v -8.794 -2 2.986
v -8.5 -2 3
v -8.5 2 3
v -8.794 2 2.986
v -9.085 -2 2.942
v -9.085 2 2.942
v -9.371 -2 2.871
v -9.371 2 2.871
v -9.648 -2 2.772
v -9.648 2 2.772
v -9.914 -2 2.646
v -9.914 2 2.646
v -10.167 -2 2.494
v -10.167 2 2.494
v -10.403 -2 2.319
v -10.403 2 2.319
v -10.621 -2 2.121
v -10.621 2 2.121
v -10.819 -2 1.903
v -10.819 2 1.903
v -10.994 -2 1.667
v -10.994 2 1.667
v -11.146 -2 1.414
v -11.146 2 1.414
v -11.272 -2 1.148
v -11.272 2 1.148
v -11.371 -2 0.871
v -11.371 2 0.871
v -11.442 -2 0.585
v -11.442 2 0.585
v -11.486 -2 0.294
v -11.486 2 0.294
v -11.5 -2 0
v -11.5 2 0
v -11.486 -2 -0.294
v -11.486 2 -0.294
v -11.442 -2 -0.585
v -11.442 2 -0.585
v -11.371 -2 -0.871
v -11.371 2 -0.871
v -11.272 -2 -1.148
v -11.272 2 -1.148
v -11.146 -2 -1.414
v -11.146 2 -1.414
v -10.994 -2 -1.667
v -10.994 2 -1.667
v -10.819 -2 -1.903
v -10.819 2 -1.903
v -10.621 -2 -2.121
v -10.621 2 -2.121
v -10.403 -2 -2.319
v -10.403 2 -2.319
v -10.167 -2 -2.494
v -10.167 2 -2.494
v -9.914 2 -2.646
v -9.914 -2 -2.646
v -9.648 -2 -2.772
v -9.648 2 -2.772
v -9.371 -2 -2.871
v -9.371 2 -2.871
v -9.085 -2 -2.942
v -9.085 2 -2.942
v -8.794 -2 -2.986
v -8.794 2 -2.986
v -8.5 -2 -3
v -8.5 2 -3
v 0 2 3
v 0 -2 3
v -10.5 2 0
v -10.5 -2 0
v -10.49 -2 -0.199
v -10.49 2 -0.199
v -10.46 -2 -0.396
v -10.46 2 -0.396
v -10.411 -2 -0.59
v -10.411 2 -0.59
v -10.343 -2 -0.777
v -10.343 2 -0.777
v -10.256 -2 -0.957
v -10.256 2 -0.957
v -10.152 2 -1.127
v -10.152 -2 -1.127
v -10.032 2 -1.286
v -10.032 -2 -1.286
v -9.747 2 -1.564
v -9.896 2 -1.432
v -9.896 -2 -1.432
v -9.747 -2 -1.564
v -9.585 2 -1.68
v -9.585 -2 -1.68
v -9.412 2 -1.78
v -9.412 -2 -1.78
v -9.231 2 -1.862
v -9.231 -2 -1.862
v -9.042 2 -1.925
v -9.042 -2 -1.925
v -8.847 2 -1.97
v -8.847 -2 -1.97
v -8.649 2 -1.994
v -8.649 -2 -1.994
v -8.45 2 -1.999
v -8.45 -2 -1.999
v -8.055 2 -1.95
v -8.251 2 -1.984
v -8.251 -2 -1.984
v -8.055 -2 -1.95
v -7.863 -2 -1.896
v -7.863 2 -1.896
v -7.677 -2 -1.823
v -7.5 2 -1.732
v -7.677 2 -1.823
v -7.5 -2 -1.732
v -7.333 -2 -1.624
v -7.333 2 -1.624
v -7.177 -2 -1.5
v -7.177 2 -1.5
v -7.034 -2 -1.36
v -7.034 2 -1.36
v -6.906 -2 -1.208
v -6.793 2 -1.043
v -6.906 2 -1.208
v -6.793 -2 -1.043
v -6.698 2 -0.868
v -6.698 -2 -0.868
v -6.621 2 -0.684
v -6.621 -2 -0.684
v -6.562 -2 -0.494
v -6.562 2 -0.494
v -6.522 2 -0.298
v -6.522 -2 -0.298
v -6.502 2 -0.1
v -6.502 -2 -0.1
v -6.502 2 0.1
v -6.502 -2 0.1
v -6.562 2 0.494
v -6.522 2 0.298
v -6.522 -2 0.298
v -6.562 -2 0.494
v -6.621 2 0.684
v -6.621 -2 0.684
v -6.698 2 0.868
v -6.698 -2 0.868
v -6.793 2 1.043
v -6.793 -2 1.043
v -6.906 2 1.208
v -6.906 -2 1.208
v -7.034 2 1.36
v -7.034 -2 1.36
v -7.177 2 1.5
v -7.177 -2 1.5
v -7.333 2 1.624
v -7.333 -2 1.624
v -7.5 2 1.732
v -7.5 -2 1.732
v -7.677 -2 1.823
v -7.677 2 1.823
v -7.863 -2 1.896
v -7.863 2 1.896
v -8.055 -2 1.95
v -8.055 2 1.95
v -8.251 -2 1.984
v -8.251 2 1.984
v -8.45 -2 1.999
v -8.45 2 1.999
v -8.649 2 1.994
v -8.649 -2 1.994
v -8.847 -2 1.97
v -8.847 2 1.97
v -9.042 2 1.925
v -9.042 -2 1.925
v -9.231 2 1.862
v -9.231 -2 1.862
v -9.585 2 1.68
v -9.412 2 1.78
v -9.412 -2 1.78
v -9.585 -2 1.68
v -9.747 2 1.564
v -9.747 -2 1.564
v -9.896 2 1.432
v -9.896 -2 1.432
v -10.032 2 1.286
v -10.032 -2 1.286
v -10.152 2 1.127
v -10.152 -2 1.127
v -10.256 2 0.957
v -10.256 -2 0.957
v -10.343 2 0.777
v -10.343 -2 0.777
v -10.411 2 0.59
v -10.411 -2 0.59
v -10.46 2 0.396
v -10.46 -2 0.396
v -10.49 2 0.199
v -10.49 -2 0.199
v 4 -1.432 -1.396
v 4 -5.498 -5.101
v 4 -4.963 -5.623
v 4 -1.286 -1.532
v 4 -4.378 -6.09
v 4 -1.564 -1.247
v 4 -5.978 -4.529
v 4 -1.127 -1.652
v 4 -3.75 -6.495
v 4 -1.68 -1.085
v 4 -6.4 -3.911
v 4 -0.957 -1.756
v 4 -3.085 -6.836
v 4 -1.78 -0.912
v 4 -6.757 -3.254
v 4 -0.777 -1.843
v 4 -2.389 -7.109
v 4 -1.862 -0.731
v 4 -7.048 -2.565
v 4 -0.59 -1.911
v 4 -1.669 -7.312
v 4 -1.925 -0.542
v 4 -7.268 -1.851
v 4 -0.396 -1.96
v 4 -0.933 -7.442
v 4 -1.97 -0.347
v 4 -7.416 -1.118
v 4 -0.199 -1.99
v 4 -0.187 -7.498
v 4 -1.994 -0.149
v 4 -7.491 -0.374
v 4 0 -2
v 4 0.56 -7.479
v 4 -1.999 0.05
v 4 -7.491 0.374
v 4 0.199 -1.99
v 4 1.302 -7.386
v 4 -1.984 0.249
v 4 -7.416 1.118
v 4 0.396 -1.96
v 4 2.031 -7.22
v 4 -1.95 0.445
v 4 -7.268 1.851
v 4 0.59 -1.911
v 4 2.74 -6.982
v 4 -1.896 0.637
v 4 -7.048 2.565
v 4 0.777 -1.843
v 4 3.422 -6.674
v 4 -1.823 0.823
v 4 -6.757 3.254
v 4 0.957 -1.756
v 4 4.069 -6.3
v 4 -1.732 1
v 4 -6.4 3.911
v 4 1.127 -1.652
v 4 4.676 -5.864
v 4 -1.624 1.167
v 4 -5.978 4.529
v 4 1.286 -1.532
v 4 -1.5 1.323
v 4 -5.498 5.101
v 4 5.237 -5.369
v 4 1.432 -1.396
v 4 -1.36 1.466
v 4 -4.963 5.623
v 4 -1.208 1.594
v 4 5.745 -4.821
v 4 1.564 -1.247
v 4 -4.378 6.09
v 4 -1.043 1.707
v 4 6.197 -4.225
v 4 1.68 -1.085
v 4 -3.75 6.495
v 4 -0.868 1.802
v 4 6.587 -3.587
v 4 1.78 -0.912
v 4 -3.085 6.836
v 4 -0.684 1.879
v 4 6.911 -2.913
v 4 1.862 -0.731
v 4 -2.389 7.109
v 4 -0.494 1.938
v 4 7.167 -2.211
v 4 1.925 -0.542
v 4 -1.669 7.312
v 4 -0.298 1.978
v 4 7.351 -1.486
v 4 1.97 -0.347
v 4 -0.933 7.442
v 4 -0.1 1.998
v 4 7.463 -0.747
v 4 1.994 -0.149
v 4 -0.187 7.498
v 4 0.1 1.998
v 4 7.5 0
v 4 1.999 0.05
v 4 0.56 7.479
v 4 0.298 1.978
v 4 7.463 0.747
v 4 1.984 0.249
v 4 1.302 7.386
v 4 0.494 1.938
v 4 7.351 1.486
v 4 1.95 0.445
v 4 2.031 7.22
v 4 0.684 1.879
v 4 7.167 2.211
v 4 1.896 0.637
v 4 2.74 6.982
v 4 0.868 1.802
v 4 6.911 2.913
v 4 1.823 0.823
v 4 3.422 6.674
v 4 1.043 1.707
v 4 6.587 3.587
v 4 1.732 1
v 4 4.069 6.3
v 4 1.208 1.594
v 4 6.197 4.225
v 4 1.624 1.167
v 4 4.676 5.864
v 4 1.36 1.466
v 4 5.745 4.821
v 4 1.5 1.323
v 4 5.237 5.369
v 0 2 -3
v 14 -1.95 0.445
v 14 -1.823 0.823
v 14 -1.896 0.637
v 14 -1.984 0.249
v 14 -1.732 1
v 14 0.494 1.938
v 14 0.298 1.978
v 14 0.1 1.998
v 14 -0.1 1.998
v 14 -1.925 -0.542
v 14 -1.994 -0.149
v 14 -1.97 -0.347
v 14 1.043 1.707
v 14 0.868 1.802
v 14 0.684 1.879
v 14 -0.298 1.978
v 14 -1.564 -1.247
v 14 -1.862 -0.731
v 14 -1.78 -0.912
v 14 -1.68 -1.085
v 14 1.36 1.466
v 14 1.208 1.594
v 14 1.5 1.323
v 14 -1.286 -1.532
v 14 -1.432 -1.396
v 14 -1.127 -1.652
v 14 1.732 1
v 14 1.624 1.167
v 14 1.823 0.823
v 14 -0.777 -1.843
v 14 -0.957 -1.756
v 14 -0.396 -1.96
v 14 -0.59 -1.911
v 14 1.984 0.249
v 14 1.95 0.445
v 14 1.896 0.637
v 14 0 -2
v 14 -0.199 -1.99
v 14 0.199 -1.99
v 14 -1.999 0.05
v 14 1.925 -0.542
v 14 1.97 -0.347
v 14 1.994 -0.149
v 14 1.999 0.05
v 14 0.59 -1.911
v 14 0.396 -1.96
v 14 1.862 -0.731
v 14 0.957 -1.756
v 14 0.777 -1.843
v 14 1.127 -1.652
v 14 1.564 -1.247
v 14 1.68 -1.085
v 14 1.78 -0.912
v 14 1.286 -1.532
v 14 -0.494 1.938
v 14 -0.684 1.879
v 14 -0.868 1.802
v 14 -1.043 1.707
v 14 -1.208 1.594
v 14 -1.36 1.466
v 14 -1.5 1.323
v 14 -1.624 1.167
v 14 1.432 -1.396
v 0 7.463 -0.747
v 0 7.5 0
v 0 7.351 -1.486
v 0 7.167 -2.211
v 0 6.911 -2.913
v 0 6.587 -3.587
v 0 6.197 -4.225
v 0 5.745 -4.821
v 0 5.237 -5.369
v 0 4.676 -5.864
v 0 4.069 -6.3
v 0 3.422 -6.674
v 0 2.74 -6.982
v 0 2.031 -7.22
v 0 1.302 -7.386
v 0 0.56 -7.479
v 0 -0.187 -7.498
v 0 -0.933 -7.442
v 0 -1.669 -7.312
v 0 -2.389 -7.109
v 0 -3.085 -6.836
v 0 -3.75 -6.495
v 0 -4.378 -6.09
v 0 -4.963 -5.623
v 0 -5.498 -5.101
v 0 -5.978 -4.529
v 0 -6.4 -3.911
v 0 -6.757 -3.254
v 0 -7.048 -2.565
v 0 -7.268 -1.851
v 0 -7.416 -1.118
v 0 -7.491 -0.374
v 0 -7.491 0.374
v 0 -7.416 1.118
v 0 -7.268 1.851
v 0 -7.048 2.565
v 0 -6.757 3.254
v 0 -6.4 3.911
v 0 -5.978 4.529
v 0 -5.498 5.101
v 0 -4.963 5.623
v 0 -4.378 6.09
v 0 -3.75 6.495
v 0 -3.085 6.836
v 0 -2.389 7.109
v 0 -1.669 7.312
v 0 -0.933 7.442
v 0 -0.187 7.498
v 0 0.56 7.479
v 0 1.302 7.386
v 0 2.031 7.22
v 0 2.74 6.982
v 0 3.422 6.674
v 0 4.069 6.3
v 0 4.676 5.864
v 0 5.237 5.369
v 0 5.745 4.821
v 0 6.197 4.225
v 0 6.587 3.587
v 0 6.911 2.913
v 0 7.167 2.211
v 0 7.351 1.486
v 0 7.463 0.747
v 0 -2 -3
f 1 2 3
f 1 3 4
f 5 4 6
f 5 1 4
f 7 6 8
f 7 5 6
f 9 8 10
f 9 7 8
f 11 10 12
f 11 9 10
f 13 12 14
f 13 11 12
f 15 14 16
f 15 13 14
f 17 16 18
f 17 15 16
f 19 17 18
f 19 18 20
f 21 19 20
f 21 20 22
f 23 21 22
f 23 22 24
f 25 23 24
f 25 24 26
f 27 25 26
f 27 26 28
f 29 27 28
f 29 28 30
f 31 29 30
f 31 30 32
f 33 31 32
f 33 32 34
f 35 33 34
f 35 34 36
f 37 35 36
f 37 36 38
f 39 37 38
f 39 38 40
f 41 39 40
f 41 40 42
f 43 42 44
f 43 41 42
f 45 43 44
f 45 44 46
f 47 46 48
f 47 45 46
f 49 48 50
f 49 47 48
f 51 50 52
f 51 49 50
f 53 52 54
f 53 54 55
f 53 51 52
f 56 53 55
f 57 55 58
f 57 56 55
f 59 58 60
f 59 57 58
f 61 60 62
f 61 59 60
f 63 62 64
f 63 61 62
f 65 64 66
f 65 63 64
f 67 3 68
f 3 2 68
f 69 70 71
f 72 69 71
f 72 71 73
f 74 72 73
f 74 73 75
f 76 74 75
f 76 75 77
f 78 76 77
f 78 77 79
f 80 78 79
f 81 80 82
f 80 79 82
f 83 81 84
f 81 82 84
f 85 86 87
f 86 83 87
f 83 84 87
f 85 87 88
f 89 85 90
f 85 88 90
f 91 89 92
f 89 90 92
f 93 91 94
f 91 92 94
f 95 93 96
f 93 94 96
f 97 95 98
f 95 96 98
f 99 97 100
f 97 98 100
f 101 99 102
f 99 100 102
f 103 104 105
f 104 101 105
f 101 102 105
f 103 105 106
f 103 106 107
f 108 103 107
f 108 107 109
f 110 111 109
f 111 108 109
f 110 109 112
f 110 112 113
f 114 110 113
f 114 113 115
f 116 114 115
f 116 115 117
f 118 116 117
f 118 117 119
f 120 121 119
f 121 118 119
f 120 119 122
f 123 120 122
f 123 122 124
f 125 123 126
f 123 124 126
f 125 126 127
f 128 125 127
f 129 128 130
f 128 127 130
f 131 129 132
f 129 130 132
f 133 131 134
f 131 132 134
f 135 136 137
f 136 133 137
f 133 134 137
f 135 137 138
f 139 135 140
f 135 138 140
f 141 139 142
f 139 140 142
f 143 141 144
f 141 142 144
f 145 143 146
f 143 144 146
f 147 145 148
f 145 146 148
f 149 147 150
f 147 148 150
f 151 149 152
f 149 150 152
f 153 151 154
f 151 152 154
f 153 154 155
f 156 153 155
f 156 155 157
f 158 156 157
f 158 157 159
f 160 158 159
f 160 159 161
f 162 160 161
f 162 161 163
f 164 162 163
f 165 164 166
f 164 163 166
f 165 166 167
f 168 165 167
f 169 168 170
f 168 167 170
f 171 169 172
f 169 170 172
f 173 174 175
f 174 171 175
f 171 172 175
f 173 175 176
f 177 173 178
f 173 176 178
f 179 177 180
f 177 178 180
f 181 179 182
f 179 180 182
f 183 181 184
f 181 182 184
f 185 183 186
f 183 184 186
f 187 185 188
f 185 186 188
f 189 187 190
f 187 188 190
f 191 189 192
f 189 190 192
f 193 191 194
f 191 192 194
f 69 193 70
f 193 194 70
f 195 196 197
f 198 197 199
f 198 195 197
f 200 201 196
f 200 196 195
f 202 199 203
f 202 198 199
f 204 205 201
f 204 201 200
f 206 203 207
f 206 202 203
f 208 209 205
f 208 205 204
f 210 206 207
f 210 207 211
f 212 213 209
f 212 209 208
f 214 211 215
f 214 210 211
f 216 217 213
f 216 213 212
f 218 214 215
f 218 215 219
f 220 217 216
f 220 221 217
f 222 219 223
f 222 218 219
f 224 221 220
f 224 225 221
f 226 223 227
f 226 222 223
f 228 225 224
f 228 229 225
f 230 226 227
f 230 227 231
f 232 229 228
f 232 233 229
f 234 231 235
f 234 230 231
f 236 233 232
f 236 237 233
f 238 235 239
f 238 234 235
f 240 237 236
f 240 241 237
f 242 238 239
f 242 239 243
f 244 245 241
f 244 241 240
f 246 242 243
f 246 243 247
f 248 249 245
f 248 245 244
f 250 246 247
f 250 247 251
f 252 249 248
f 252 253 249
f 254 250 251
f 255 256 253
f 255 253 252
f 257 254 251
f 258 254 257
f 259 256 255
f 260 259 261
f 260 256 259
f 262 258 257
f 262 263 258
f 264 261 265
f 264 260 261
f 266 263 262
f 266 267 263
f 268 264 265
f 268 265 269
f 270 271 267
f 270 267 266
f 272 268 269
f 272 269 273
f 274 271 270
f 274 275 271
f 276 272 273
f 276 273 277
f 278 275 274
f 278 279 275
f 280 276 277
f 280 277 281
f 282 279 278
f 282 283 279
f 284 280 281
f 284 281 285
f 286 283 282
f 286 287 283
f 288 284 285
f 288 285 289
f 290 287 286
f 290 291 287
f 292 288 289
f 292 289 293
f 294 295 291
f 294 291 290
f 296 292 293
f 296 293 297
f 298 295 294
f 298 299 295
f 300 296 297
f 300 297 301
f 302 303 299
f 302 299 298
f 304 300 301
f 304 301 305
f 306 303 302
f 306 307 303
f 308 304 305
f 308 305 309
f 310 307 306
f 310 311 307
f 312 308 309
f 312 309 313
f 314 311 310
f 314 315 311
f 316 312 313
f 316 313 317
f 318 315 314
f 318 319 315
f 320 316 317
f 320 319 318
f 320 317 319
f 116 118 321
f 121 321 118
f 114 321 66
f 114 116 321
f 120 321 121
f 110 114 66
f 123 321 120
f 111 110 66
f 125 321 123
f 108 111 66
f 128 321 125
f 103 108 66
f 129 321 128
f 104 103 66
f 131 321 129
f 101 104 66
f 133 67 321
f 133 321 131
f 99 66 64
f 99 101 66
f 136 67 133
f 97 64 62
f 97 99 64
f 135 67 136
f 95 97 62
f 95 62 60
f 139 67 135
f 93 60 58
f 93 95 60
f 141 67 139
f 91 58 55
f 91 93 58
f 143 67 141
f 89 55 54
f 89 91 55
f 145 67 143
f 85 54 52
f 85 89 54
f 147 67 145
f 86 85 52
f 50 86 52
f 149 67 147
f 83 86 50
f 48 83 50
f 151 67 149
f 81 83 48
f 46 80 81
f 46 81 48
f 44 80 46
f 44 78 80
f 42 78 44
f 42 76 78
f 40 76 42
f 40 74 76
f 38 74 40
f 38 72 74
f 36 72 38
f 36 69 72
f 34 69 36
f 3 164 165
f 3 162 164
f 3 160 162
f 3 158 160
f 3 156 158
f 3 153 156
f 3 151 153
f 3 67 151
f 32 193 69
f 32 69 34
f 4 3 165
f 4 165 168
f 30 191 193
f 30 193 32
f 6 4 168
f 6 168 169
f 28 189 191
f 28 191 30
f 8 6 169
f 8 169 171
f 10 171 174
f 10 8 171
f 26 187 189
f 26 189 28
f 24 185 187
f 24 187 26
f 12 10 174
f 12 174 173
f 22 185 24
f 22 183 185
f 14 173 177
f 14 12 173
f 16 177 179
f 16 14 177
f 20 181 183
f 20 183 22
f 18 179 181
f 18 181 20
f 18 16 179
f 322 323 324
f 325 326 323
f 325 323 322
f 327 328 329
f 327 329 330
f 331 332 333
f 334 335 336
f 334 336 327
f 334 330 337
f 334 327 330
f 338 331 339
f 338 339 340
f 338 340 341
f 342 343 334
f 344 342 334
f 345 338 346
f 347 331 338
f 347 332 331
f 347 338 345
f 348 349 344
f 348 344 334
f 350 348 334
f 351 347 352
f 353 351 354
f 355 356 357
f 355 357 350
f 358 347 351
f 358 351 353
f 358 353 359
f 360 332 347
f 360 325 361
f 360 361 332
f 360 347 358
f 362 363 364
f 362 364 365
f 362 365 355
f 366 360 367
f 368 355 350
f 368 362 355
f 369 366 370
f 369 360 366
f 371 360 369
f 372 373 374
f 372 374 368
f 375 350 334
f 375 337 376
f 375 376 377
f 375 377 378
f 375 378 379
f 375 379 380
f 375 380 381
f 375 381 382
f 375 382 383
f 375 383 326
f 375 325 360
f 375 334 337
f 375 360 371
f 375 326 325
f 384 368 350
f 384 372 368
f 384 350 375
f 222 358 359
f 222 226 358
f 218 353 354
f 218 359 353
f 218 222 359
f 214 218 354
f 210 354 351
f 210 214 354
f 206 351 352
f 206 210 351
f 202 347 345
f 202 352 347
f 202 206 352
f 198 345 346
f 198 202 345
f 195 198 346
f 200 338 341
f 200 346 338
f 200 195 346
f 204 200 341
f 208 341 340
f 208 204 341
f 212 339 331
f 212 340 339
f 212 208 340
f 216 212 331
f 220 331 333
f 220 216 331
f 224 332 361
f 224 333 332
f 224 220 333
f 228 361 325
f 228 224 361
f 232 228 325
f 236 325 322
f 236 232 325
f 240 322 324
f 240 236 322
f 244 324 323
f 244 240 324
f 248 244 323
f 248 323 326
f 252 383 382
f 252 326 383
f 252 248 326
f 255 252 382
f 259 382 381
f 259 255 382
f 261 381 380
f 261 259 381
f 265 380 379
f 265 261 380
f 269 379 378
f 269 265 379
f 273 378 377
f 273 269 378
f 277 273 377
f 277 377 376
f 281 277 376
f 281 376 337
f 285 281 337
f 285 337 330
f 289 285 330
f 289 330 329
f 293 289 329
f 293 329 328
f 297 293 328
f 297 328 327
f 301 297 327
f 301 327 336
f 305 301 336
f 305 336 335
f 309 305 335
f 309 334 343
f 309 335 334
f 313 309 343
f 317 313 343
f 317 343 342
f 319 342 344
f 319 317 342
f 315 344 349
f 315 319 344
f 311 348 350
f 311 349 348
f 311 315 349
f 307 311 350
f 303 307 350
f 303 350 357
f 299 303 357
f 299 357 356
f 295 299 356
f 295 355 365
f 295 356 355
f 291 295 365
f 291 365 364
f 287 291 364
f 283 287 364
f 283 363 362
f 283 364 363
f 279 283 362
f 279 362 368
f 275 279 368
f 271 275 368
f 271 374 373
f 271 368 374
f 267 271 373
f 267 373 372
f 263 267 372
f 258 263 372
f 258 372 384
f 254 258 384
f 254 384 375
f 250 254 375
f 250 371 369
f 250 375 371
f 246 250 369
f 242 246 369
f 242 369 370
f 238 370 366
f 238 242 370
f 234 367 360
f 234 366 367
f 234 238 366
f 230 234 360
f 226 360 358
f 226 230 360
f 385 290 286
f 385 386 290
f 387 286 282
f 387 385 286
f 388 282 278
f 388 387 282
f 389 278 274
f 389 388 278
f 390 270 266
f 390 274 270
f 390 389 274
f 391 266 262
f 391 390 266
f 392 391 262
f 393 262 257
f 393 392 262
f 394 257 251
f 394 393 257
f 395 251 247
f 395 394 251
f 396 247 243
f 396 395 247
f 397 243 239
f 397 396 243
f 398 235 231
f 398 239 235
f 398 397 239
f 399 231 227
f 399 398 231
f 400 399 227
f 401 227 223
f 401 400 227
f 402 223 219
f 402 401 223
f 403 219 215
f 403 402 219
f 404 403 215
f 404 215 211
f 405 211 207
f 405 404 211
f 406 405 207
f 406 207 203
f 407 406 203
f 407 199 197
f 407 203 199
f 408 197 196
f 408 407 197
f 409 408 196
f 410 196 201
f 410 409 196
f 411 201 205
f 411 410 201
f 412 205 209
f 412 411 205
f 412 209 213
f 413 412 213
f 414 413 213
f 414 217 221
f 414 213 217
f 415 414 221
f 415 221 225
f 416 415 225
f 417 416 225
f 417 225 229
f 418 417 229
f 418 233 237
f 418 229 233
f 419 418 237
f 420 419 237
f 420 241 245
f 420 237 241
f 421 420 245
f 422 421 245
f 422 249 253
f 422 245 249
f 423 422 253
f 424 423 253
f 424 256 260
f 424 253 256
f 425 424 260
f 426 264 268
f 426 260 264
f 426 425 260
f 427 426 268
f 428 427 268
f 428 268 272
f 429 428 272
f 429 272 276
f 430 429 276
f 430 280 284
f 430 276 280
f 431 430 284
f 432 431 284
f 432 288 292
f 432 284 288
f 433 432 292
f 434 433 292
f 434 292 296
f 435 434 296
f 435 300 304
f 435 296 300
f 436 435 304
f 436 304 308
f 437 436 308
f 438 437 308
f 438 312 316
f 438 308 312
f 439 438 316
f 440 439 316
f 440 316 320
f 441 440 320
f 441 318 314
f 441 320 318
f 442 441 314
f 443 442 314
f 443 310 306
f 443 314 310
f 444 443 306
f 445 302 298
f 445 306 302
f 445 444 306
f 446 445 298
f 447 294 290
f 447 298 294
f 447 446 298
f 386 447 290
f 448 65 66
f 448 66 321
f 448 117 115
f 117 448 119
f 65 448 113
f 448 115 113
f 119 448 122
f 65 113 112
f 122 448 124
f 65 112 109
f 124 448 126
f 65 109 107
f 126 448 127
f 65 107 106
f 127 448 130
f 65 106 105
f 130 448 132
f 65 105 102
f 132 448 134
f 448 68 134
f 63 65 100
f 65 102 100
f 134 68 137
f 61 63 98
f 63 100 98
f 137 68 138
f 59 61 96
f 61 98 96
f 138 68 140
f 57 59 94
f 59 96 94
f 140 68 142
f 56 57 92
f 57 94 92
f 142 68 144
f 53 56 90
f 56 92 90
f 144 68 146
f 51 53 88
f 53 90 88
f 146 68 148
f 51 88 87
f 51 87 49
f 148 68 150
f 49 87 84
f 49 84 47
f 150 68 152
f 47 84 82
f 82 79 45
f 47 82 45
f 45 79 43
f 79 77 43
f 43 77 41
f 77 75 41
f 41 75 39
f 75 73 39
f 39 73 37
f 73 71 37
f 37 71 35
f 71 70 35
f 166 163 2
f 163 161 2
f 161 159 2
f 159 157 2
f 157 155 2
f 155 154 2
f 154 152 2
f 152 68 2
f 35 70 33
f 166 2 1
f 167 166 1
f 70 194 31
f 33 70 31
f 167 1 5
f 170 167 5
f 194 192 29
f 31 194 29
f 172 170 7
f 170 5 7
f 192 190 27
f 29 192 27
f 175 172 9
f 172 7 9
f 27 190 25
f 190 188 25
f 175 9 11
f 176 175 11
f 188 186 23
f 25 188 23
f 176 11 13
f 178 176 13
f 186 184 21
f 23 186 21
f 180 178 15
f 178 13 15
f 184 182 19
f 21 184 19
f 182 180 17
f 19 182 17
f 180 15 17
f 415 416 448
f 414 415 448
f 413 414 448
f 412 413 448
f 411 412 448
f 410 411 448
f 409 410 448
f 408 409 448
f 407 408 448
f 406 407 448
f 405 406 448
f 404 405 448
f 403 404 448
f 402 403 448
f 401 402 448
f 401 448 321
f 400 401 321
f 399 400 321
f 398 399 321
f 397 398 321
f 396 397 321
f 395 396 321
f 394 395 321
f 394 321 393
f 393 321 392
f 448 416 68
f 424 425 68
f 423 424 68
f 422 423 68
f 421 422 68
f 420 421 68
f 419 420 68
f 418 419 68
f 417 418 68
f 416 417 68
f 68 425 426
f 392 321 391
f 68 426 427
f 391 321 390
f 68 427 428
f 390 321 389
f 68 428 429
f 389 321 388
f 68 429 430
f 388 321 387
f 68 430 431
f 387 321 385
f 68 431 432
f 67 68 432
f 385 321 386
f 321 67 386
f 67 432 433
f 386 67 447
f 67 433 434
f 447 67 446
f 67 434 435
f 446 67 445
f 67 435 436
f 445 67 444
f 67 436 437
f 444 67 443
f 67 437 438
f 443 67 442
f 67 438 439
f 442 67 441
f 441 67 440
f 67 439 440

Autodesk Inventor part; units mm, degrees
ref_plane "YZ Plane" through (0, 0, 0) normal (1, 0, 0) x (0, 1, 0)
ref_plane "XZ Plane" through (0, 0, 0) normal (0, 1, 0) x (-1, 0, 0)
ref_plane "XY Plane" through (0, 0, 0) normal (0, 0, 1) x (1, 0, 0)
sketch "スケッチ1" plane through (0, 0, 0) normal (1, 0, 0) x (0, 1, 0)
  circle A0 centre (0, 0) radius 7.5
  dimension "d0" = 15
extrude "押し出し1" add sketch "スケッチ1" along normal blind 4
sketch "スケッチ2" plane through (0, 0, 0) normal (0, 1, 0) x (-1, 0, 0)
  circle A0 centre (8.5, 0) radius 2
  circle A1 centre (8.5, 0) radius 3
  line L0 (8.5, -3) -> (0, -3)
  line L1 (0, 7.5) -> (0, -7.5) projected
  line L2 (8.5, 3) -> (0, 3)
  point P0 (0, 0)
  dimension "d3" = 4
  dimension "d4" = 6
  dimension "d5" = 8.5
extrude "押し出し2" add sketch "スケッチ2" along normal mid plane 4
sketch "スケッチ3" plane through (4, 0, 0) normal (1, 0, 0) x (0, 0, -1)
  circle A0 centre (0, 0) radius 2
  dimension "d8" = 4
extrude "押し出し3" add sketch "スケッチ3" along normal blind 10
properties part number "pink-suspension-top" material "ABS プラスチック"
